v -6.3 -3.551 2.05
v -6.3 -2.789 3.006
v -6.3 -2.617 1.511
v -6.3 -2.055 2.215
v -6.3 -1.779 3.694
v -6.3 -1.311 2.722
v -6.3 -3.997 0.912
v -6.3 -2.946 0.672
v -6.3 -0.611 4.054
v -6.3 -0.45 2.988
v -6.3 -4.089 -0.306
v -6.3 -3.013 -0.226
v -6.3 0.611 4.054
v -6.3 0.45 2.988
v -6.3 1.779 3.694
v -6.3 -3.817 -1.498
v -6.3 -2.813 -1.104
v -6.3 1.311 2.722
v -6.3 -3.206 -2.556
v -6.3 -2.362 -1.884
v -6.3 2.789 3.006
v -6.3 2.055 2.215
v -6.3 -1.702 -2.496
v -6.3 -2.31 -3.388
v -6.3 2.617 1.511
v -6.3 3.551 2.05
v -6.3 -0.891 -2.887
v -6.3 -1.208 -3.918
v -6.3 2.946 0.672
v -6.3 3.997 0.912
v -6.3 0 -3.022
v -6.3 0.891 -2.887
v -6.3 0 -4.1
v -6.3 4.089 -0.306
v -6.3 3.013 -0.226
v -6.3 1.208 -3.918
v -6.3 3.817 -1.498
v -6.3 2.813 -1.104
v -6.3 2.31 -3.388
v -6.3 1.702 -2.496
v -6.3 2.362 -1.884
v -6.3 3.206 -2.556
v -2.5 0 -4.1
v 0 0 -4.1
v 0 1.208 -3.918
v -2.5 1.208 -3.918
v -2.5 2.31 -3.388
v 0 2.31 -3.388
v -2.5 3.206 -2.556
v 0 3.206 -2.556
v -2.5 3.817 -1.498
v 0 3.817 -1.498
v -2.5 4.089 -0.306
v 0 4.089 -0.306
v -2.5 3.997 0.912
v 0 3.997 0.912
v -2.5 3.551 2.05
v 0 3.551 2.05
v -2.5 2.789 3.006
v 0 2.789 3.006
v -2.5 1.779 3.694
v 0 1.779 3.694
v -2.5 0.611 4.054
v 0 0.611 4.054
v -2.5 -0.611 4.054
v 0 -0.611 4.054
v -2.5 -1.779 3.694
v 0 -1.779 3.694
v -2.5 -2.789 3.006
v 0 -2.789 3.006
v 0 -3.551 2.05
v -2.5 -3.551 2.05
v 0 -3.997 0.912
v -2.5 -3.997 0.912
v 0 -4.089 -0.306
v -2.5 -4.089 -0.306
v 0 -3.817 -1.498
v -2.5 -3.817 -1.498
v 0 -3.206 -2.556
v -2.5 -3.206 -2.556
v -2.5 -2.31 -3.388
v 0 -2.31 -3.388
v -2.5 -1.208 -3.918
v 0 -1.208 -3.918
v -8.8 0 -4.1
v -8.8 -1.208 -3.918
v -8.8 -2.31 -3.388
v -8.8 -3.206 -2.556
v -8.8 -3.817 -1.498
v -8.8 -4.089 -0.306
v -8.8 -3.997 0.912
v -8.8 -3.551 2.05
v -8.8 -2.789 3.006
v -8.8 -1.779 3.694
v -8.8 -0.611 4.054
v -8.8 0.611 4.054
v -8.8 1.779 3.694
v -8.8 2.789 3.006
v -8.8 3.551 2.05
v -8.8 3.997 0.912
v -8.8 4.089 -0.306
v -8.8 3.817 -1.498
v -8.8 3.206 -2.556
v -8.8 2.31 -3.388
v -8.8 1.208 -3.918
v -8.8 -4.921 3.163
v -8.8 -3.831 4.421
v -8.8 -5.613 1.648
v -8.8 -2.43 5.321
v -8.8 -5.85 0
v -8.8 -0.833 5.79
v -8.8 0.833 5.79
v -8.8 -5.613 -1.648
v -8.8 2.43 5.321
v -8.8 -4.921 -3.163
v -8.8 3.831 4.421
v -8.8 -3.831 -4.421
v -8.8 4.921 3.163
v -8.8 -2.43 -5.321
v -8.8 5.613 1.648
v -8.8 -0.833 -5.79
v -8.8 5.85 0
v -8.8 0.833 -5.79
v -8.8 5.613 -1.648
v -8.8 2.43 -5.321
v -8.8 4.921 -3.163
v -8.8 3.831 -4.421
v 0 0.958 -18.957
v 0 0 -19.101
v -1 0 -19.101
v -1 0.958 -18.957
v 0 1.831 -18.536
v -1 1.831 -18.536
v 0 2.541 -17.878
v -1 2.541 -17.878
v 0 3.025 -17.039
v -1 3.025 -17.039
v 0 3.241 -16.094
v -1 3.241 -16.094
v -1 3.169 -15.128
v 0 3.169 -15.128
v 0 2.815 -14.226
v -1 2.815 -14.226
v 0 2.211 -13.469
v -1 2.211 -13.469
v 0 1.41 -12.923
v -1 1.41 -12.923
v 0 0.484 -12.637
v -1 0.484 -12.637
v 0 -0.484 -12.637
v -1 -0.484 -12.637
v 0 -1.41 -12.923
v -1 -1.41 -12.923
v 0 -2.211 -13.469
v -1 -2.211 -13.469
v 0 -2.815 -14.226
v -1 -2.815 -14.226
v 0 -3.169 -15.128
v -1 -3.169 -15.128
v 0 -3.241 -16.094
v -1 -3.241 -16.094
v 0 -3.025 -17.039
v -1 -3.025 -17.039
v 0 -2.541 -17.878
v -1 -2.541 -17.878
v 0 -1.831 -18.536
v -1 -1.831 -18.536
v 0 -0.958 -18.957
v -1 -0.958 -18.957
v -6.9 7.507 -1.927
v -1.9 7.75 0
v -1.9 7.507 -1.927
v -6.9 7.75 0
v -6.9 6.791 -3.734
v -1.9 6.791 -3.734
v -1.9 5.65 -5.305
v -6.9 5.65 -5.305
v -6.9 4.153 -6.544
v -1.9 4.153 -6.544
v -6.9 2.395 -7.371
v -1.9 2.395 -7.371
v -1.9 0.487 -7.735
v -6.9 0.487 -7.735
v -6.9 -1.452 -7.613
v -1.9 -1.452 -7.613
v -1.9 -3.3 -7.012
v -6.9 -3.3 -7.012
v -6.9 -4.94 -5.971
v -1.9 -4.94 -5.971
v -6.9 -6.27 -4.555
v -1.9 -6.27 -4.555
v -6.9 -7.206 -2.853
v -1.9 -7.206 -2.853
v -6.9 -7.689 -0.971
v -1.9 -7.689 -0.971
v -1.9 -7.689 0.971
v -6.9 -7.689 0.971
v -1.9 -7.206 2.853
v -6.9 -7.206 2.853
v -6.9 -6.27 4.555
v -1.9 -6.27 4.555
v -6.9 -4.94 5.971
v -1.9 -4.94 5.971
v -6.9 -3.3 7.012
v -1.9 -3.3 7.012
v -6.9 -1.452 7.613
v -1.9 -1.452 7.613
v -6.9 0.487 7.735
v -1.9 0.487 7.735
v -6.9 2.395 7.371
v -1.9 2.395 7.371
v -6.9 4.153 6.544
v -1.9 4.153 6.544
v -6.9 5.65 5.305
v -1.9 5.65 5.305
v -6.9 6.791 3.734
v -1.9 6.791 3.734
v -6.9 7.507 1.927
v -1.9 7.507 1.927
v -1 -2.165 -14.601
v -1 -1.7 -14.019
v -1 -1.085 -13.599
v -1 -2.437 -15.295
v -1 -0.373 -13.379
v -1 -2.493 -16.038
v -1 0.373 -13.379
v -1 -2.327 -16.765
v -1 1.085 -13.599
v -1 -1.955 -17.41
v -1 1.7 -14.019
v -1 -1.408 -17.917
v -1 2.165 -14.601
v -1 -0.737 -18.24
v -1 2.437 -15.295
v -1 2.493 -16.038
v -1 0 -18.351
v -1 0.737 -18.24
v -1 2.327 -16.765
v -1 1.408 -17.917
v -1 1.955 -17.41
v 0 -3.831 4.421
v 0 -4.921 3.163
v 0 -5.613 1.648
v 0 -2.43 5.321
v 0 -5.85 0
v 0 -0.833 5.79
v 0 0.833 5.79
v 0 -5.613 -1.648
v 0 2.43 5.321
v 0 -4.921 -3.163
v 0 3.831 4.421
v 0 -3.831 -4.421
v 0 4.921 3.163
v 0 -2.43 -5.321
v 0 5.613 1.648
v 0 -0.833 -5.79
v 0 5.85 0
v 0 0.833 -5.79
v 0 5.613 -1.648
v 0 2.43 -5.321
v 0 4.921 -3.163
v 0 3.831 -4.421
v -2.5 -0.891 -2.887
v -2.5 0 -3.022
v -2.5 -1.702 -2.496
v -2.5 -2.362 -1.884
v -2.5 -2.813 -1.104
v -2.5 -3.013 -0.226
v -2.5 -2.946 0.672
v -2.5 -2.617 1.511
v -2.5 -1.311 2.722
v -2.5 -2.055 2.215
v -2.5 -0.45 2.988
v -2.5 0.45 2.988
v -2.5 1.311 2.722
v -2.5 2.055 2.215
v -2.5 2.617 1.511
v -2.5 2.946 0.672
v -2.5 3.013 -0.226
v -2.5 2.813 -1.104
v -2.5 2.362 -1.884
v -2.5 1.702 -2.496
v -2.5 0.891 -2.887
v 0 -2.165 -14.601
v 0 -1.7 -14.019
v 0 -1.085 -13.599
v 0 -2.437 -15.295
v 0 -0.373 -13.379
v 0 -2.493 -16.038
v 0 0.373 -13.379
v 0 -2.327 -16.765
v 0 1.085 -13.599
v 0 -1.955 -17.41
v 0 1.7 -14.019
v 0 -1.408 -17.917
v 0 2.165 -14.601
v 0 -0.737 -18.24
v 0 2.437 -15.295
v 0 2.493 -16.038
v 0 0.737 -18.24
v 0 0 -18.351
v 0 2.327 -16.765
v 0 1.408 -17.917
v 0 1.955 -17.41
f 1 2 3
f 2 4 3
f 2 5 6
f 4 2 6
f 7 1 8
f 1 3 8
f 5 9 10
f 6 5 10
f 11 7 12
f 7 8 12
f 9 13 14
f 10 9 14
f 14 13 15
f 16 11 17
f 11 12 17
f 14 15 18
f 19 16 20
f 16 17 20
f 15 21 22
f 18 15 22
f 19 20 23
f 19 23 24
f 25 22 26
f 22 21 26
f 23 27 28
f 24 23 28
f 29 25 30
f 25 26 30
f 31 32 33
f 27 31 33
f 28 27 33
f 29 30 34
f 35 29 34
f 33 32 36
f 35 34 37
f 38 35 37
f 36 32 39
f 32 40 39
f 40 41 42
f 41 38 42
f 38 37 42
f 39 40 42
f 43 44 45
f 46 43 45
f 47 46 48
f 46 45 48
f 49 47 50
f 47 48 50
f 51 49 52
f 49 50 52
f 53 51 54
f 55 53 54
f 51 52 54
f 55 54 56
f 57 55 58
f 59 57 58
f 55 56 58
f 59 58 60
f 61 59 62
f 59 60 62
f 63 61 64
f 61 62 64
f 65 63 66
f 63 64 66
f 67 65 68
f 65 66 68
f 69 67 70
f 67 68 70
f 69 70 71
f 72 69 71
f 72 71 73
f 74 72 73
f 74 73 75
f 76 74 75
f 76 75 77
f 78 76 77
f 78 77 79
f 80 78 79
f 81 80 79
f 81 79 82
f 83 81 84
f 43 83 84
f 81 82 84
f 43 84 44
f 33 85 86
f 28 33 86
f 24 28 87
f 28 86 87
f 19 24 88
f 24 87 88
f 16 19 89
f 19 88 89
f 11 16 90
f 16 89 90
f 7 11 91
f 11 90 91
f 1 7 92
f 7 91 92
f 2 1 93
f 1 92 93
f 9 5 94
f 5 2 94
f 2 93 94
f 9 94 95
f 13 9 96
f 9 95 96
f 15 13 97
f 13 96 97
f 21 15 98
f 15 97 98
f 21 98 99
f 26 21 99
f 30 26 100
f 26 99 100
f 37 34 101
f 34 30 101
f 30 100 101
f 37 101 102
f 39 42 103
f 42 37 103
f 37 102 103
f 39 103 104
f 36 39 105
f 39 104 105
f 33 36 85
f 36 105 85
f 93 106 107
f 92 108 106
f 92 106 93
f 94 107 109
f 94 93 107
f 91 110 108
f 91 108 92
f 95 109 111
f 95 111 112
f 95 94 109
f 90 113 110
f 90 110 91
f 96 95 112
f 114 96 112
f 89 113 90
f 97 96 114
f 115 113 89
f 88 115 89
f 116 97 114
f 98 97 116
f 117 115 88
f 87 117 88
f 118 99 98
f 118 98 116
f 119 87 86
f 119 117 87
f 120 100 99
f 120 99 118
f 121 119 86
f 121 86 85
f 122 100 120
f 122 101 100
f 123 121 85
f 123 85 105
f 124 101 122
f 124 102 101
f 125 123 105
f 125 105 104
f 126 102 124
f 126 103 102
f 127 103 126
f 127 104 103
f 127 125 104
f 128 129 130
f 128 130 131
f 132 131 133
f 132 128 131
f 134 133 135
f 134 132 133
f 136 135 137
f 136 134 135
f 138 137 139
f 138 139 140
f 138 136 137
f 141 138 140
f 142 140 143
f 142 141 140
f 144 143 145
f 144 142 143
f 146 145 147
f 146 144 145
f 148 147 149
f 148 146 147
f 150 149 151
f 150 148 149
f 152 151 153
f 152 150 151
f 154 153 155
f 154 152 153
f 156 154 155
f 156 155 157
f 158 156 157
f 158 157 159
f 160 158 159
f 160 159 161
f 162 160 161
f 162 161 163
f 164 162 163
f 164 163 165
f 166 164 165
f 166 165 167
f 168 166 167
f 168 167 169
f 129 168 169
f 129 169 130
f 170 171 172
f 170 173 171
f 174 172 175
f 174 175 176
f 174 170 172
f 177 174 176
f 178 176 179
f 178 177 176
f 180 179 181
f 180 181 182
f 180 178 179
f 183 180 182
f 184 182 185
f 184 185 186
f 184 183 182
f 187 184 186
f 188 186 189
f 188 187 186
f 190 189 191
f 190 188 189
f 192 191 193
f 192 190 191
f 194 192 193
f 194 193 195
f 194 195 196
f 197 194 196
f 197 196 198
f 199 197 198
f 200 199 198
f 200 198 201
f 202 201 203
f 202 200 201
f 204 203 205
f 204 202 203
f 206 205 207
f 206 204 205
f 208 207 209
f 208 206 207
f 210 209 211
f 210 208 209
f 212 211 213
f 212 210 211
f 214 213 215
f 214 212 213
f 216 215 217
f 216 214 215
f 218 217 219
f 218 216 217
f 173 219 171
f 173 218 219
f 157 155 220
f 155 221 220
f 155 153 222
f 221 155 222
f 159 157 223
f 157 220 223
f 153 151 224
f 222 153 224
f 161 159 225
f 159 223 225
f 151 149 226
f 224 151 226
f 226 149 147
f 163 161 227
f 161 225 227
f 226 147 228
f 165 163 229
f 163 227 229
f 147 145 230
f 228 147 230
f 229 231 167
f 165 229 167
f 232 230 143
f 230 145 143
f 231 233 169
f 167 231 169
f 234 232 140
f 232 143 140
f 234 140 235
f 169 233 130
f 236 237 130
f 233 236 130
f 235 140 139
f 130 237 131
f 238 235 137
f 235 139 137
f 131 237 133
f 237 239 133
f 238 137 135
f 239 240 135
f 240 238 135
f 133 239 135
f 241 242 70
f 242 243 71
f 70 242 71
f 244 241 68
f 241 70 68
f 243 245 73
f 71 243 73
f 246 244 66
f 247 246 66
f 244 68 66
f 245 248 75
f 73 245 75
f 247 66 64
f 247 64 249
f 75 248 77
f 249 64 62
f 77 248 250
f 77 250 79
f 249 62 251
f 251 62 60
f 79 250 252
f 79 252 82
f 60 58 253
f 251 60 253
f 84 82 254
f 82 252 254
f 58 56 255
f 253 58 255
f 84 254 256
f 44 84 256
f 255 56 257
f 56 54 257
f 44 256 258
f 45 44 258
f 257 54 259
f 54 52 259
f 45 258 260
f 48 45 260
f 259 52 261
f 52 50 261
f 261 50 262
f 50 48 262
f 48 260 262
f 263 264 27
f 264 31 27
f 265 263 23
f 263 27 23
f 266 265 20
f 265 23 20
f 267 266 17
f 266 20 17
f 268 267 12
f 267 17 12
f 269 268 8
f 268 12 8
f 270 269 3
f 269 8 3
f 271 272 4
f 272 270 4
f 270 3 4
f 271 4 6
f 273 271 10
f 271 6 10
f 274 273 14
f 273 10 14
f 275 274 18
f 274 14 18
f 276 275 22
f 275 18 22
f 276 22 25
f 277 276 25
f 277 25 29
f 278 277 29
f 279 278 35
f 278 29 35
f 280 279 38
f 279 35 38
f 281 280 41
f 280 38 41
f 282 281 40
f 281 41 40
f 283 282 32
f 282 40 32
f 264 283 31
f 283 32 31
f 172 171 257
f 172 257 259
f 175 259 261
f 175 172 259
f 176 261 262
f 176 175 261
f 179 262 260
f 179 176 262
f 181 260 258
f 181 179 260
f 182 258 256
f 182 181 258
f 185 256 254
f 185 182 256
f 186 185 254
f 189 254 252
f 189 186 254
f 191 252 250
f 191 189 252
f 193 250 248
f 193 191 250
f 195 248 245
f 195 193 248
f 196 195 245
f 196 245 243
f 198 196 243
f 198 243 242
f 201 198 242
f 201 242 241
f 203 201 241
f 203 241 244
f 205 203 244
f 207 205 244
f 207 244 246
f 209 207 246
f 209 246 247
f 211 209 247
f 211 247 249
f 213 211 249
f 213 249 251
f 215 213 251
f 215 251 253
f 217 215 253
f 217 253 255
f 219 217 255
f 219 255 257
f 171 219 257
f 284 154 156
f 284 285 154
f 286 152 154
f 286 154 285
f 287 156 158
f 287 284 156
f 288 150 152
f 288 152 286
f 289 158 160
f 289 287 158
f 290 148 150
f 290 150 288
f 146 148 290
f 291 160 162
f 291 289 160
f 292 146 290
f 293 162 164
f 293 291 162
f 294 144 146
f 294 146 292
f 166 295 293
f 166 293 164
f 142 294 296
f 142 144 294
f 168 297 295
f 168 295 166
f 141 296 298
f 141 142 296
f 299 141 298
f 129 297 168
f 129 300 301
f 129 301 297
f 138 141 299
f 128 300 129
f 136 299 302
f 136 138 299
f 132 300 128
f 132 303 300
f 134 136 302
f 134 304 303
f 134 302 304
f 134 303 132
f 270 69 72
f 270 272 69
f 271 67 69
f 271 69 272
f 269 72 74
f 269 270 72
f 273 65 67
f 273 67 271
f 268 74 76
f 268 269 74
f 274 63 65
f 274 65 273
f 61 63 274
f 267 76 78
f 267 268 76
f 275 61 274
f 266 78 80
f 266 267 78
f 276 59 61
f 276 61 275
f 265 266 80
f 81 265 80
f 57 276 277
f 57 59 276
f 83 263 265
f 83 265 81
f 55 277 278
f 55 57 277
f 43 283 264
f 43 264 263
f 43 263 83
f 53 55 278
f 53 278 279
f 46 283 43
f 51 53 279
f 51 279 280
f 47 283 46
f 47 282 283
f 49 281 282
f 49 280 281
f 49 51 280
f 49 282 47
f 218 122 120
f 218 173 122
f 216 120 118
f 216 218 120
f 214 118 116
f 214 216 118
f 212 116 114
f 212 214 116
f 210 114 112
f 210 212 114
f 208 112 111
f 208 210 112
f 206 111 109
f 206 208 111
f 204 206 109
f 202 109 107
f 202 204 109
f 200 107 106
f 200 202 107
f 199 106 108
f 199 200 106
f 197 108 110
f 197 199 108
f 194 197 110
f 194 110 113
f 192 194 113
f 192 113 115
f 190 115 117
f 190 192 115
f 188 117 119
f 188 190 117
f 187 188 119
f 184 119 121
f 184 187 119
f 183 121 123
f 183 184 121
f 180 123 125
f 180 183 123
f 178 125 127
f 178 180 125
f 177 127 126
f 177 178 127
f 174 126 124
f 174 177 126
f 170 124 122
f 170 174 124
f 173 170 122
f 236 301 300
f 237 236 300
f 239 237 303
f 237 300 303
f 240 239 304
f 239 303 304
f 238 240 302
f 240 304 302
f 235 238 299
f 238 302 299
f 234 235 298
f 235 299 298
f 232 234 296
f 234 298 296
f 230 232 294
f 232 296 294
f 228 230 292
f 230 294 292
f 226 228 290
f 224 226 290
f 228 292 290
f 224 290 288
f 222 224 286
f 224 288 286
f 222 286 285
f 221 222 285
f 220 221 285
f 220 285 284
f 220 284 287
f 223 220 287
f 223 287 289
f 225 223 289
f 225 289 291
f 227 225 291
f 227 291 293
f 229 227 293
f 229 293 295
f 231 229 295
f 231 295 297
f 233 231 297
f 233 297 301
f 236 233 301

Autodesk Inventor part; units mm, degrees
ref_plane "YZ Plane" through (0, 0, 0) normal (1, 0, 0) x (0, 1, 0)
ref_plane "XZ Plane" through (0, 0, 0) normal (0, 1, 0) x (-1, 0, 0)
ref_plane "XY Plane" through (0, 0, 0) normal (0, 0, 1) x (1, 0, 0)
sketch "Sketch1" plane through (0, 0, 0) normal (0, 0, 1) x (1, 0, 0)
  line L0 (0, 0) -> (0, 5.85)
  line L1 (0, 0) -> (-8.8, 0)
  line L2 (-8.8, 0) -> (-8.8, 5.85)
  line L3 (-6.9, 0) -> (-6.9, 7.75)
  line L4 (-8.8, 5.85) -> (-6.9, 7.75)
  line L5 (0, 5.85) -> (-1.9, 7.75)
  line L6 (-1.9, 7.75) -> (-6.9, 7.75)
  point P0 (-5.5, 0)
  dimension "d0" = 8.8
  dimension "d1" = 7.75
  dimension "d3" = 1.9
  dimension "d8" = 5
  dimension "d9" = 45
  dimension "d10" = 135
revolve "Revolution1" add sketch "Sketch1" angle 360 about axis through (0, 0, 0) along (-1, 0, 0)
ref_plane "Work Plane1" through (-4.4, 0, 0) normal (1, 0, 0) x (0, 0, -1)
sketch "Sketch2" plane through (0, 0, 0) normal (1, 0, 0) x (0, 0, -1)
  circle A0 centre (0, 0) radius 5.85 projected
  circle A1 centre (0, 0) radius 2.55
  point P0 (0, 0)
  dimension "d11" = 5.1
extrude "Extrusion1" cut sketch "Sketch2" against normal through all contours A1
sketch "Sketch3" plane through (0, 0, 0) normal (0, 1, 0) x (-1, 0, 0)
  line L0 (6.9, 7.75) -> (6.9, -7.75) projected
  line L1 (8.8, 5.85) -> (8.8, -5.85) projected
  line L2 (8.8, 0) -> (6.3, 0)
  line L3 (6.3, 0) -> (6.3, -4.1)
  line L4 (6.3, -4.1) -> (8.8, -4.1)
  line L5 (8.8, -4.1) -> (8.8, 0)
  line L6 (0, 0) -> (2.5, 0)
  line L7 (2.5, 0) -> (2.5, -4.1)
  line L8 (2.5, -4.1) -> (0, -4.1)
  line L9 (0, -4.1) -> (0, 0)
  line L10 (6.3, 0) -> (2.5, 0)
  line L11 (2.5, 0) -> (2.5, -3.0215)
  line L12 (2.5, -3.0215) -> (6.3, -3.0215)
  line L13 (6.3, -3.0215) -> (6.3, 0)
  dimension "d14" = 2.5
  dimension "d15" = 4.1
  dimension "d16" = 2.5
revolve "Revolution2" cut sketch "Sketch3" angle 360 about axis through (-6.3, 0, 0) along (1, 0, 0)
sketch "Sketch4" plane through (0, 0, 0) normal (1, 0, 0) x (0, 0, -1)
  circle A0 centre (15.8512, 0) radius 2.5
  circle A1 centre (15.8512, 0) radius 3.25
  point P0 (0, 0)
  dimension "d18" = 5
  dimension "d19" = 6.5
extrude "Extrusion2" add sketch "Sketch4" against normal blind 1
properties part number "Neje_Rolls_small"
